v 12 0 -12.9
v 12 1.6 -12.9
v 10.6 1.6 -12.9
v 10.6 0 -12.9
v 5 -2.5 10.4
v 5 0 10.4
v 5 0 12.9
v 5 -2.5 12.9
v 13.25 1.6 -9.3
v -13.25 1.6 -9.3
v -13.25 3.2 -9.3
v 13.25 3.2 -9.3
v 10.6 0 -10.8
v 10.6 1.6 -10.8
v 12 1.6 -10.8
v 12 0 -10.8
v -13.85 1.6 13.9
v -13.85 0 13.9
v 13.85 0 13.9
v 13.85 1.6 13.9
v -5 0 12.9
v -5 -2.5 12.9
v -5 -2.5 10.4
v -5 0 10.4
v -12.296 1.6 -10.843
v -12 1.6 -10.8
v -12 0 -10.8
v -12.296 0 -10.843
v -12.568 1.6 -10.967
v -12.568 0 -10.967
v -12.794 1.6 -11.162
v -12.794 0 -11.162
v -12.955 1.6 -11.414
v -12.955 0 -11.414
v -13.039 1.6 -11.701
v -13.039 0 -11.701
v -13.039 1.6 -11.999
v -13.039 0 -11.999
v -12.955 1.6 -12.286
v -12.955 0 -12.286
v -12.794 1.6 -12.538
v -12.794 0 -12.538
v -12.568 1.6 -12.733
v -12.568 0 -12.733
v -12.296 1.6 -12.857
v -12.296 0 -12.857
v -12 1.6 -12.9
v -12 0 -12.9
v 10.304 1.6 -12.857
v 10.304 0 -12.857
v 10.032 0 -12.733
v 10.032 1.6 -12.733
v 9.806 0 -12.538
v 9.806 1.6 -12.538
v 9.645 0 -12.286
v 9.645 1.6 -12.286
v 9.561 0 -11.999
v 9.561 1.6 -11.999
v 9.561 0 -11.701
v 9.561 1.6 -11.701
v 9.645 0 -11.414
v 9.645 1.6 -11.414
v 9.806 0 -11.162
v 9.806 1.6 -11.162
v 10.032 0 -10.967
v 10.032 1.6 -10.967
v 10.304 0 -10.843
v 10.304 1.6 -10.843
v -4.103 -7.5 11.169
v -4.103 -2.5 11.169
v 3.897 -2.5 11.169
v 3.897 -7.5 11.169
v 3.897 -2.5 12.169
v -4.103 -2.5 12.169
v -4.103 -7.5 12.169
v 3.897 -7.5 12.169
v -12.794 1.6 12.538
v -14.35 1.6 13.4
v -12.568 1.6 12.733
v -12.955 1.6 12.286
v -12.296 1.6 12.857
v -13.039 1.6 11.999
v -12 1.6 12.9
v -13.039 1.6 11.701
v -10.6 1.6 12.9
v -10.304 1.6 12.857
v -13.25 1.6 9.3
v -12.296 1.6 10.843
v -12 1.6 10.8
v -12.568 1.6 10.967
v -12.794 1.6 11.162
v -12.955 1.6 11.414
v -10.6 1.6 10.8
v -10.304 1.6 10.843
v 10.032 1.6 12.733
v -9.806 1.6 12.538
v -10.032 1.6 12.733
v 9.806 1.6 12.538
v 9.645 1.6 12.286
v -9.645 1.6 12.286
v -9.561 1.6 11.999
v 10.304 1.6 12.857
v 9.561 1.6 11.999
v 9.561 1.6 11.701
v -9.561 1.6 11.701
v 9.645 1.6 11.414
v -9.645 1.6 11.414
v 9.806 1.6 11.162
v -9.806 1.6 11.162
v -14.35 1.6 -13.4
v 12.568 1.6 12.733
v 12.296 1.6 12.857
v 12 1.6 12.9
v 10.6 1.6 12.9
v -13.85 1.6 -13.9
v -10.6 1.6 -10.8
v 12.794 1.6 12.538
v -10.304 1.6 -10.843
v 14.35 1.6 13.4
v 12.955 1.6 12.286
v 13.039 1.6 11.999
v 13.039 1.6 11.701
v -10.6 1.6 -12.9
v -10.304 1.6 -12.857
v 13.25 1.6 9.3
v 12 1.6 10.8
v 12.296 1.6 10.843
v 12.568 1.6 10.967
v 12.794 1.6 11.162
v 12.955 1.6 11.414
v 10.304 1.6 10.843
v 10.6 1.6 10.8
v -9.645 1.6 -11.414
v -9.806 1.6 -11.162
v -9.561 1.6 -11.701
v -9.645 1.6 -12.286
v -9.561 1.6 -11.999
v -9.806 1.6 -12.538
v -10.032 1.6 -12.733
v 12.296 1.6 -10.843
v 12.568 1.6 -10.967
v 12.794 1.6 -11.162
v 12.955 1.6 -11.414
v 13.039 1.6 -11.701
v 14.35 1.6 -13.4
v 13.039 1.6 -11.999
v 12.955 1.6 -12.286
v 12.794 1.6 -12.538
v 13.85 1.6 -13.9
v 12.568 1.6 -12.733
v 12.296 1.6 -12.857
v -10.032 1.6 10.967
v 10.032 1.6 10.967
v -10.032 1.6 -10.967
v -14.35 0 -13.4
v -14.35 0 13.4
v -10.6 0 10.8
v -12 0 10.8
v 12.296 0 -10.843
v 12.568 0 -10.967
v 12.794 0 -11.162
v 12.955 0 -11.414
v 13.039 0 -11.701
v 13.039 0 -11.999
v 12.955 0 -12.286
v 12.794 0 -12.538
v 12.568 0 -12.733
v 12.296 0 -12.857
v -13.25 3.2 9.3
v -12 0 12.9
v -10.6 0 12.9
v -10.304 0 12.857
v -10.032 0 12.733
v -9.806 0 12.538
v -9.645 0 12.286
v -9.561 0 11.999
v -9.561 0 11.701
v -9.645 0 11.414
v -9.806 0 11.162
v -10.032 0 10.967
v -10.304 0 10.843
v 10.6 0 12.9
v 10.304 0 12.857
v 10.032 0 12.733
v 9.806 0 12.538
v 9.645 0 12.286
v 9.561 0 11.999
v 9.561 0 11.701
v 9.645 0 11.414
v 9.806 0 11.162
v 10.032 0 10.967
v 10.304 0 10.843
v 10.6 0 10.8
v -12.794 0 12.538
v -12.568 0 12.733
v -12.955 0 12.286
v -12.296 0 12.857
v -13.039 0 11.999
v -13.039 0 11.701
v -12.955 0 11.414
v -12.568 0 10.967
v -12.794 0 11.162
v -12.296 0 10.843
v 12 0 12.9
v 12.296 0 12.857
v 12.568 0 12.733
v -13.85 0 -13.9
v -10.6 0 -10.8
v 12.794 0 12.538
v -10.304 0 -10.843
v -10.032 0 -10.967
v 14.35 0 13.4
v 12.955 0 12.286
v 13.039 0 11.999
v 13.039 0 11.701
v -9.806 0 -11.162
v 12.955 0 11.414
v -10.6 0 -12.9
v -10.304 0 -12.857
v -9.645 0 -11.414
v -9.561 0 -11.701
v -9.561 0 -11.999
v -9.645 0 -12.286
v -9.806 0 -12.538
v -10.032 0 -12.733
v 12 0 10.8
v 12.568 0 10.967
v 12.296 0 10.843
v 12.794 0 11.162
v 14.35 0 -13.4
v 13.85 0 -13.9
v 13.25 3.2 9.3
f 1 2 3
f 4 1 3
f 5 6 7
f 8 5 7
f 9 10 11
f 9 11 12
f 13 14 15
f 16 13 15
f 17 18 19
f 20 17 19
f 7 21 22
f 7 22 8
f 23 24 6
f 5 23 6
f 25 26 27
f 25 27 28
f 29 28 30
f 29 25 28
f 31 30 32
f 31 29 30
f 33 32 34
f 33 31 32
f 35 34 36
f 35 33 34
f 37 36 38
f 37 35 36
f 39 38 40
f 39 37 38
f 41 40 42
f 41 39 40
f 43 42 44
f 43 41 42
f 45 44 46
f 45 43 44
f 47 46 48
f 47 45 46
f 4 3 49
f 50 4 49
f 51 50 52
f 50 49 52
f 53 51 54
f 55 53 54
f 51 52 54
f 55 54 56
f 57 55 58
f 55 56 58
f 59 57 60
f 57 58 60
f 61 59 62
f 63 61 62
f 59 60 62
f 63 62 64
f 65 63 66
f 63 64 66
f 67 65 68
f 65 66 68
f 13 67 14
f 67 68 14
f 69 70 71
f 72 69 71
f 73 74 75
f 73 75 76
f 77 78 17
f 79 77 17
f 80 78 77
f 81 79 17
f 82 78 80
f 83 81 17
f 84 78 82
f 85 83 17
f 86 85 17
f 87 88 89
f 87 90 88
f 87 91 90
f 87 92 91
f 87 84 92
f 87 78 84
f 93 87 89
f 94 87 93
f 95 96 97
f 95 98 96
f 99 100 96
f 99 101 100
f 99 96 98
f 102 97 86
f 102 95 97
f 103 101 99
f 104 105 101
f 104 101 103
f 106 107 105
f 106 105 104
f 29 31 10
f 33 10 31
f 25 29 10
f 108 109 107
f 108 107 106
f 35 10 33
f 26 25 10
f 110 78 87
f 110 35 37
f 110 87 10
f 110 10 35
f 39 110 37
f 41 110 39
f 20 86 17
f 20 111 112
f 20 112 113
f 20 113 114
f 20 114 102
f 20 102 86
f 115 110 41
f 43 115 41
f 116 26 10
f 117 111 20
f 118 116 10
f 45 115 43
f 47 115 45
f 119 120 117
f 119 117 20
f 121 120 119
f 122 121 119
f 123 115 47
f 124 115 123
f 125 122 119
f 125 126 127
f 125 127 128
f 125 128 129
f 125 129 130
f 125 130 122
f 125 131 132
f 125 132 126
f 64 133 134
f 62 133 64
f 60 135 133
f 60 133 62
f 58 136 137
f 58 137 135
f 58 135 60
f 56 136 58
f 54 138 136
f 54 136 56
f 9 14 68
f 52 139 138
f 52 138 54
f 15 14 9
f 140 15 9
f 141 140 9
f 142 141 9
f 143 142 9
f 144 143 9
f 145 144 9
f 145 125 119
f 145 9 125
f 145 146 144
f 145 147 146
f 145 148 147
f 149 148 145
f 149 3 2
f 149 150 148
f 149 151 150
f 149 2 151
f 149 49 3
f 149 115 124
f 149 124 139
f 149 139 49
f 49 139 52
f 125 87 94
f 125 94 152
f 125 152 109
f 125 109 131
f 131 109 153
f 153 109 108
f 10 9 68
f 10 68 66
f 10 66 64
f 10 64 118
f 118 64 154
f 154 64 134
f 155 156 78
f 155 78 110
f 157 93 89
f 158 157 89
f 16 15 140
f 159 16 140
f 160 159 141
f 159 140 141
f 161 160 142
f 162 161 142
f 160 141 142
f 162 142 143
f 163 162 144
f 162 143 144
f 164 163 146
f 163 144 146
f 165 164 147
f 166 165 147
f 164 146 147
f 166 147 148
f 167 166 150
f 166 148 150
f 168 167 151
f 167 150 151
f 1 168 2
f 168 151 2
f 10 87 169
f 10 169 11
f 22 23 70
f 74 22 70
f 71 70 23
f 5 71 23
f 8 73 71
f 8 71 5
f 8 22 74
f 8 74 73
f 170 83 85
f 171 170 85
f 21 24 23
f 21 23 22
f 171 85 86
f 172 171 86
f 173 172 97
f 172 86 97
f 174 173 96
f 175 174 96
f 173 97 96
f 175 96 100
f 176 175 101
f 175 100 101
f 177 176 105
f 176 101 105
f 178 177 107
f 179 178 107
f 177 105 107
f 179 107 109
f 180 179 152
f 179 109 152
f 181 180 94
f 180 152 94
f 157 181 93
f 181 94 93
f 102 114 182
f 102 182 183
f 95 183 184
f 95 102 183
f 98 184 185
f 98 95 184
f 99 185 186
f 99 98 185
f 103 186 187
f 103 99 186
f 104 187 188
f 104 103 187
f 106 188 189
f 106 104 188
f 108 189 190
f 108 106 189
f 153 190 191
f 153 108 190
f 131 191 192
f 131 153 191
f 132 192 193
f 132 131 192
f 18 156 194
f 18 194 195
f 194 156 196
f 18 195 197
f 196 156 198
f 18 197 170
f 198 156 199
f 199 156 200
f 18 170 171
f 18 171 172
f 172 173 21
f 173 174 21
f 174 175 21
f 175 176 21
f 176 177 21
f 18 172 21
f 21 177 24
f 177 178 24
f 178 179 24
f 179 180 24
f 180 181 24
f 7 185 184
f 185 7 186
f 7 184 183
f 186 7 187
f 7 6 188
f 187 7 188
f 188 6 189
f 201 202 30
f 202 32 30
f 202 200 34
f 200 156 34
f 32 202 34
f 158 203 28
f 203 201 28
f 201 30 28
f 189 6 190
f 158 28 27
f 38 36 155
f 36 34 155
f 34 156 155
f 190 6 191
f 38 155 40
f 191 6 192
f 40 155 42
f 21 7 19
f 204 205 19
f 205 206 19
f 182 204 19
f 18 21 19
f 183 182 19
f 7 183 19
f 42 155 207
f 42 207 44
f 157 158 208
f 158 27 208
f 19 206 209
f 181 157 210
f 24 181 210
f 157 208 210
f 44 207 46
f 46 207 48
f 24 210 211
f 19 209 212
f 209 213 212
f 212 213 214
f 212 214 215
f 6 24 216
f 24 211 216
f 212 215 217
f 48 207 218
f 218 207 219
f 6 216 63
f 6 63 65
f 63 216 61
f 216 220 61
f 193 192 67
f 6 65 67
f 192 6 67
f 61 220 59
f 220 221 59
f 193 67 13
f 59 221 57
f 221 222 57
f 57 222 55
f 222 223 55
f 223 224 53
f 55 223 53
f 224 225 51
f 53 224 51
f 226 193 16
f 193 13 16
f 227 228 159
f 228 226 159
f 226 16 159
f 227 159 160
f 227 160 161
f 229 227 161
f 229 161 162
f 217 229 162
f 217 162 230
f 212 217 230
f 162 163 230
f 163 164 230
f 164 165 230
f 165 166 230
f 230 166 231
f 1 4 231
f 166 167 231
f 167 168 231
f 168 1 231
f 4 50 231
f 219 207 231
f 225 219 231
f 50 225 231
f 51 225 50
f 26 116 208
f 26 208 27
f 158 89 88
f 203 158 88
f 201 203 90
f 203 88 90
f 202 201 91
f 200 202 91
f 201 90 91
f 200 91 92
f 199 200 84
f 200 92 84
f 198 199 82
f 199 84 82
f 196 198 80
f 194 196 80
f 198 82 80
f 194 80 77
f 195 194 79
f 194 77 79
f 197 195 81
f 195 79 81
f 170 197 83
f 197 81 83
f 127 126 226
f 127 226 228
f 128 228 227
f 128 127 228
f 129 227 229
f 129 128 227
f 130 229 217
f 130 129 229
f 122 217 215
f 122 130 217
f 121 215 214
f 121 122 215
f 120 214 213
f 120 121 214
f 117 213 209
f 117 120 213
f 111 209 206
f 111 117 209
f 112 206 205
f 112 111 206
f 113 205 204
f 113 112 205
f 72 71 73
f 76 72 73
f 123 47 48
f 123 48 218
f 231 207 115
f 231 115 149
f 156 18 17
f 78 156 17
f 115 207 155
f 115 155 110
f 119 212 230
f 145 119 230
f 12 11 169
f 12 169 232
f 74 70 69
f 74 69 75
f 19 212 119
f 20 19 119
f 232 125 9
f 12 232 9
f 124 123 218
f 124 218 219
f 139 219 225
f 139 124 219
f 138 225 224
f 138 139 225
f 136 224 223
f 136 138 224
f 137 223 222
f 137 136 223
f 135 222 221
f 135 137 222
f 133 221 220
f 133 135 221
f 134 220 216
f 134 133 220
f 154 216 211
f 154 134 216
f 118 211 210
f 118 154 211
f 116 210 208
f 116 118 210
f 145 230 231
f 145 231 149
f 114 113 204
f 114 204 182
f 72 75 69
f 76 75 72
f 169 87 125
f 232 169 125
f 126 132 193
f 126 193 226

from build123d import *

# Parameters (mm, degrees)
SKETCH_1_W          = 28.7
SKETCH_1_H          = 27.8
EXTRUDE_1_DEPTH     = 1.6
SKETCH_2_W          = 26.5
SKETCH_2_H          = 18.6
EXTRUDE_2_DEPTH     = 1.6
CUT_EXTRUDE_1_DEPTH = 21.042267836
CHAMFER_1_SIZE      = 0.5
SKETCH_4_W          = 10
SKETCH_4_H          = 2.5
EXTRUDE_3_DEPTH     = 2.5
SKETCH_5_W          = 8
SKETCH_5_H          = 1
EXTRUDE_4_DEPTH     = 5


with BuildPart() as part:
    # 草图1 → 凸台-拉伸1 (new body)
    with BuildSketch(Plane(origin=(0, 0, 0), x_dir=(1, 0, 0), z_dir=(0, 1, 0))):
        Rectangle(SKETCH_1_W, SKETCH_1_H)
    extrude(amount=EXTRUDE_1_DEPTH)

    # 草图2 → 凸台-拉伸2 (add)
    with BuildSketch(Plane(origin=(0, 1.6, 0), x_dir=(1, 0, 0), z_dir=(0, 1, 0))):
        Rectangle(SKETCH_2_W, SKETCH_2_H)
    extrude(amount=EXTRUDE_2_DEPTH)

    # 草图3 → 切除-拉伸1 (cut, through all)
    with BuildSketch(Plane(origin=(0, 1.6, 0), x_dir=(1, 0, 0), z_dir=(0, 1, 0))):
        with BuildLine():
            Line((-12, 12.9), (-10.6, 12.9))
            ThreePointArc((-10.6, 12.9), (-9.55, 11.85), (-10.6, 10.8))
            Line((-10.6, 10.8), (-12, 10.8))
            ThreePointArc((-12, 10.8), (-13.05, 11.85), (-12, 12.9))
        make_face()
        with BuildLine():
            Line((12, 12.9), (10.6, 12.9))
            ThreePointArc((10.6, 12.9), (9.55, 11.85), (10.6, 10.8))
            Line((10.6, 10.8), (12, 10.8))
            ThreePointArc((12, 10.8), (13.05, 11.85), (12, 12.9))
        make_face()
        with BuildLine():
            Line((12, -12.9), (10.6, -12.9))
            ThreePointArc((10.6, -12.9), (9.55, -11.85), (10.6, -10.8))
            Line((10.6, -10.8), (12, -10.8))
            ThreePointArc((12, -10.8), (13.05, -11.85), (12, -12.9))
        make_face()
        with BuildLine():
            Line((-12, -12.9), (-10.6, -12.9))
            ThreePointArc((-10.6, -12.9), (-9.55, -11.85), (-10.6, -10.8))
            Line((-10.6, -10.8), (-12, -10.8))
            ThreePointArc((-12, -10.8), (-13.05, -11.85), (-12, -12.9))
        make_face()
    extrude(amount=-CUT_EXTRUDE_1_DEPTH, mode=Mode.SUBTRACT)

    # 倒角1
    chamfer_1_edges = [part.edges().sort_by_distance(p)[0] for p in [
        (14.35, 0.8, 13.9),
        (-14.35, 0.8, 13.9),
        (-14.35, 0.8, -13.9),
        (14.35, 0.8, -13.9),
    ]]
    chamfer(chamfer_1_edges, length=CHAMFER_1_SIZE)

    # 草图4 → 凸台-拉伸3 (add)
    with BuildSketch(Plane.XZ):
        with Locations((0, 11.65)):
            Rectangle(SKETCH_4_W, SKETCH_4_H)
    extrude(amount=EXTRUDE_3_DEPTH)

    # 草图5 → 凸台-拉伸4 (add)
    with BuildSketch(Plane.XZ.offset(2.5)):
        with Locations((-0.103219582, 11.669441564)):
            Rectangle(SKETCH_5_W, SKETCH_5_H)
    extrude(amount=EXTRUDE_4_DEPTH)


solid = part.part
